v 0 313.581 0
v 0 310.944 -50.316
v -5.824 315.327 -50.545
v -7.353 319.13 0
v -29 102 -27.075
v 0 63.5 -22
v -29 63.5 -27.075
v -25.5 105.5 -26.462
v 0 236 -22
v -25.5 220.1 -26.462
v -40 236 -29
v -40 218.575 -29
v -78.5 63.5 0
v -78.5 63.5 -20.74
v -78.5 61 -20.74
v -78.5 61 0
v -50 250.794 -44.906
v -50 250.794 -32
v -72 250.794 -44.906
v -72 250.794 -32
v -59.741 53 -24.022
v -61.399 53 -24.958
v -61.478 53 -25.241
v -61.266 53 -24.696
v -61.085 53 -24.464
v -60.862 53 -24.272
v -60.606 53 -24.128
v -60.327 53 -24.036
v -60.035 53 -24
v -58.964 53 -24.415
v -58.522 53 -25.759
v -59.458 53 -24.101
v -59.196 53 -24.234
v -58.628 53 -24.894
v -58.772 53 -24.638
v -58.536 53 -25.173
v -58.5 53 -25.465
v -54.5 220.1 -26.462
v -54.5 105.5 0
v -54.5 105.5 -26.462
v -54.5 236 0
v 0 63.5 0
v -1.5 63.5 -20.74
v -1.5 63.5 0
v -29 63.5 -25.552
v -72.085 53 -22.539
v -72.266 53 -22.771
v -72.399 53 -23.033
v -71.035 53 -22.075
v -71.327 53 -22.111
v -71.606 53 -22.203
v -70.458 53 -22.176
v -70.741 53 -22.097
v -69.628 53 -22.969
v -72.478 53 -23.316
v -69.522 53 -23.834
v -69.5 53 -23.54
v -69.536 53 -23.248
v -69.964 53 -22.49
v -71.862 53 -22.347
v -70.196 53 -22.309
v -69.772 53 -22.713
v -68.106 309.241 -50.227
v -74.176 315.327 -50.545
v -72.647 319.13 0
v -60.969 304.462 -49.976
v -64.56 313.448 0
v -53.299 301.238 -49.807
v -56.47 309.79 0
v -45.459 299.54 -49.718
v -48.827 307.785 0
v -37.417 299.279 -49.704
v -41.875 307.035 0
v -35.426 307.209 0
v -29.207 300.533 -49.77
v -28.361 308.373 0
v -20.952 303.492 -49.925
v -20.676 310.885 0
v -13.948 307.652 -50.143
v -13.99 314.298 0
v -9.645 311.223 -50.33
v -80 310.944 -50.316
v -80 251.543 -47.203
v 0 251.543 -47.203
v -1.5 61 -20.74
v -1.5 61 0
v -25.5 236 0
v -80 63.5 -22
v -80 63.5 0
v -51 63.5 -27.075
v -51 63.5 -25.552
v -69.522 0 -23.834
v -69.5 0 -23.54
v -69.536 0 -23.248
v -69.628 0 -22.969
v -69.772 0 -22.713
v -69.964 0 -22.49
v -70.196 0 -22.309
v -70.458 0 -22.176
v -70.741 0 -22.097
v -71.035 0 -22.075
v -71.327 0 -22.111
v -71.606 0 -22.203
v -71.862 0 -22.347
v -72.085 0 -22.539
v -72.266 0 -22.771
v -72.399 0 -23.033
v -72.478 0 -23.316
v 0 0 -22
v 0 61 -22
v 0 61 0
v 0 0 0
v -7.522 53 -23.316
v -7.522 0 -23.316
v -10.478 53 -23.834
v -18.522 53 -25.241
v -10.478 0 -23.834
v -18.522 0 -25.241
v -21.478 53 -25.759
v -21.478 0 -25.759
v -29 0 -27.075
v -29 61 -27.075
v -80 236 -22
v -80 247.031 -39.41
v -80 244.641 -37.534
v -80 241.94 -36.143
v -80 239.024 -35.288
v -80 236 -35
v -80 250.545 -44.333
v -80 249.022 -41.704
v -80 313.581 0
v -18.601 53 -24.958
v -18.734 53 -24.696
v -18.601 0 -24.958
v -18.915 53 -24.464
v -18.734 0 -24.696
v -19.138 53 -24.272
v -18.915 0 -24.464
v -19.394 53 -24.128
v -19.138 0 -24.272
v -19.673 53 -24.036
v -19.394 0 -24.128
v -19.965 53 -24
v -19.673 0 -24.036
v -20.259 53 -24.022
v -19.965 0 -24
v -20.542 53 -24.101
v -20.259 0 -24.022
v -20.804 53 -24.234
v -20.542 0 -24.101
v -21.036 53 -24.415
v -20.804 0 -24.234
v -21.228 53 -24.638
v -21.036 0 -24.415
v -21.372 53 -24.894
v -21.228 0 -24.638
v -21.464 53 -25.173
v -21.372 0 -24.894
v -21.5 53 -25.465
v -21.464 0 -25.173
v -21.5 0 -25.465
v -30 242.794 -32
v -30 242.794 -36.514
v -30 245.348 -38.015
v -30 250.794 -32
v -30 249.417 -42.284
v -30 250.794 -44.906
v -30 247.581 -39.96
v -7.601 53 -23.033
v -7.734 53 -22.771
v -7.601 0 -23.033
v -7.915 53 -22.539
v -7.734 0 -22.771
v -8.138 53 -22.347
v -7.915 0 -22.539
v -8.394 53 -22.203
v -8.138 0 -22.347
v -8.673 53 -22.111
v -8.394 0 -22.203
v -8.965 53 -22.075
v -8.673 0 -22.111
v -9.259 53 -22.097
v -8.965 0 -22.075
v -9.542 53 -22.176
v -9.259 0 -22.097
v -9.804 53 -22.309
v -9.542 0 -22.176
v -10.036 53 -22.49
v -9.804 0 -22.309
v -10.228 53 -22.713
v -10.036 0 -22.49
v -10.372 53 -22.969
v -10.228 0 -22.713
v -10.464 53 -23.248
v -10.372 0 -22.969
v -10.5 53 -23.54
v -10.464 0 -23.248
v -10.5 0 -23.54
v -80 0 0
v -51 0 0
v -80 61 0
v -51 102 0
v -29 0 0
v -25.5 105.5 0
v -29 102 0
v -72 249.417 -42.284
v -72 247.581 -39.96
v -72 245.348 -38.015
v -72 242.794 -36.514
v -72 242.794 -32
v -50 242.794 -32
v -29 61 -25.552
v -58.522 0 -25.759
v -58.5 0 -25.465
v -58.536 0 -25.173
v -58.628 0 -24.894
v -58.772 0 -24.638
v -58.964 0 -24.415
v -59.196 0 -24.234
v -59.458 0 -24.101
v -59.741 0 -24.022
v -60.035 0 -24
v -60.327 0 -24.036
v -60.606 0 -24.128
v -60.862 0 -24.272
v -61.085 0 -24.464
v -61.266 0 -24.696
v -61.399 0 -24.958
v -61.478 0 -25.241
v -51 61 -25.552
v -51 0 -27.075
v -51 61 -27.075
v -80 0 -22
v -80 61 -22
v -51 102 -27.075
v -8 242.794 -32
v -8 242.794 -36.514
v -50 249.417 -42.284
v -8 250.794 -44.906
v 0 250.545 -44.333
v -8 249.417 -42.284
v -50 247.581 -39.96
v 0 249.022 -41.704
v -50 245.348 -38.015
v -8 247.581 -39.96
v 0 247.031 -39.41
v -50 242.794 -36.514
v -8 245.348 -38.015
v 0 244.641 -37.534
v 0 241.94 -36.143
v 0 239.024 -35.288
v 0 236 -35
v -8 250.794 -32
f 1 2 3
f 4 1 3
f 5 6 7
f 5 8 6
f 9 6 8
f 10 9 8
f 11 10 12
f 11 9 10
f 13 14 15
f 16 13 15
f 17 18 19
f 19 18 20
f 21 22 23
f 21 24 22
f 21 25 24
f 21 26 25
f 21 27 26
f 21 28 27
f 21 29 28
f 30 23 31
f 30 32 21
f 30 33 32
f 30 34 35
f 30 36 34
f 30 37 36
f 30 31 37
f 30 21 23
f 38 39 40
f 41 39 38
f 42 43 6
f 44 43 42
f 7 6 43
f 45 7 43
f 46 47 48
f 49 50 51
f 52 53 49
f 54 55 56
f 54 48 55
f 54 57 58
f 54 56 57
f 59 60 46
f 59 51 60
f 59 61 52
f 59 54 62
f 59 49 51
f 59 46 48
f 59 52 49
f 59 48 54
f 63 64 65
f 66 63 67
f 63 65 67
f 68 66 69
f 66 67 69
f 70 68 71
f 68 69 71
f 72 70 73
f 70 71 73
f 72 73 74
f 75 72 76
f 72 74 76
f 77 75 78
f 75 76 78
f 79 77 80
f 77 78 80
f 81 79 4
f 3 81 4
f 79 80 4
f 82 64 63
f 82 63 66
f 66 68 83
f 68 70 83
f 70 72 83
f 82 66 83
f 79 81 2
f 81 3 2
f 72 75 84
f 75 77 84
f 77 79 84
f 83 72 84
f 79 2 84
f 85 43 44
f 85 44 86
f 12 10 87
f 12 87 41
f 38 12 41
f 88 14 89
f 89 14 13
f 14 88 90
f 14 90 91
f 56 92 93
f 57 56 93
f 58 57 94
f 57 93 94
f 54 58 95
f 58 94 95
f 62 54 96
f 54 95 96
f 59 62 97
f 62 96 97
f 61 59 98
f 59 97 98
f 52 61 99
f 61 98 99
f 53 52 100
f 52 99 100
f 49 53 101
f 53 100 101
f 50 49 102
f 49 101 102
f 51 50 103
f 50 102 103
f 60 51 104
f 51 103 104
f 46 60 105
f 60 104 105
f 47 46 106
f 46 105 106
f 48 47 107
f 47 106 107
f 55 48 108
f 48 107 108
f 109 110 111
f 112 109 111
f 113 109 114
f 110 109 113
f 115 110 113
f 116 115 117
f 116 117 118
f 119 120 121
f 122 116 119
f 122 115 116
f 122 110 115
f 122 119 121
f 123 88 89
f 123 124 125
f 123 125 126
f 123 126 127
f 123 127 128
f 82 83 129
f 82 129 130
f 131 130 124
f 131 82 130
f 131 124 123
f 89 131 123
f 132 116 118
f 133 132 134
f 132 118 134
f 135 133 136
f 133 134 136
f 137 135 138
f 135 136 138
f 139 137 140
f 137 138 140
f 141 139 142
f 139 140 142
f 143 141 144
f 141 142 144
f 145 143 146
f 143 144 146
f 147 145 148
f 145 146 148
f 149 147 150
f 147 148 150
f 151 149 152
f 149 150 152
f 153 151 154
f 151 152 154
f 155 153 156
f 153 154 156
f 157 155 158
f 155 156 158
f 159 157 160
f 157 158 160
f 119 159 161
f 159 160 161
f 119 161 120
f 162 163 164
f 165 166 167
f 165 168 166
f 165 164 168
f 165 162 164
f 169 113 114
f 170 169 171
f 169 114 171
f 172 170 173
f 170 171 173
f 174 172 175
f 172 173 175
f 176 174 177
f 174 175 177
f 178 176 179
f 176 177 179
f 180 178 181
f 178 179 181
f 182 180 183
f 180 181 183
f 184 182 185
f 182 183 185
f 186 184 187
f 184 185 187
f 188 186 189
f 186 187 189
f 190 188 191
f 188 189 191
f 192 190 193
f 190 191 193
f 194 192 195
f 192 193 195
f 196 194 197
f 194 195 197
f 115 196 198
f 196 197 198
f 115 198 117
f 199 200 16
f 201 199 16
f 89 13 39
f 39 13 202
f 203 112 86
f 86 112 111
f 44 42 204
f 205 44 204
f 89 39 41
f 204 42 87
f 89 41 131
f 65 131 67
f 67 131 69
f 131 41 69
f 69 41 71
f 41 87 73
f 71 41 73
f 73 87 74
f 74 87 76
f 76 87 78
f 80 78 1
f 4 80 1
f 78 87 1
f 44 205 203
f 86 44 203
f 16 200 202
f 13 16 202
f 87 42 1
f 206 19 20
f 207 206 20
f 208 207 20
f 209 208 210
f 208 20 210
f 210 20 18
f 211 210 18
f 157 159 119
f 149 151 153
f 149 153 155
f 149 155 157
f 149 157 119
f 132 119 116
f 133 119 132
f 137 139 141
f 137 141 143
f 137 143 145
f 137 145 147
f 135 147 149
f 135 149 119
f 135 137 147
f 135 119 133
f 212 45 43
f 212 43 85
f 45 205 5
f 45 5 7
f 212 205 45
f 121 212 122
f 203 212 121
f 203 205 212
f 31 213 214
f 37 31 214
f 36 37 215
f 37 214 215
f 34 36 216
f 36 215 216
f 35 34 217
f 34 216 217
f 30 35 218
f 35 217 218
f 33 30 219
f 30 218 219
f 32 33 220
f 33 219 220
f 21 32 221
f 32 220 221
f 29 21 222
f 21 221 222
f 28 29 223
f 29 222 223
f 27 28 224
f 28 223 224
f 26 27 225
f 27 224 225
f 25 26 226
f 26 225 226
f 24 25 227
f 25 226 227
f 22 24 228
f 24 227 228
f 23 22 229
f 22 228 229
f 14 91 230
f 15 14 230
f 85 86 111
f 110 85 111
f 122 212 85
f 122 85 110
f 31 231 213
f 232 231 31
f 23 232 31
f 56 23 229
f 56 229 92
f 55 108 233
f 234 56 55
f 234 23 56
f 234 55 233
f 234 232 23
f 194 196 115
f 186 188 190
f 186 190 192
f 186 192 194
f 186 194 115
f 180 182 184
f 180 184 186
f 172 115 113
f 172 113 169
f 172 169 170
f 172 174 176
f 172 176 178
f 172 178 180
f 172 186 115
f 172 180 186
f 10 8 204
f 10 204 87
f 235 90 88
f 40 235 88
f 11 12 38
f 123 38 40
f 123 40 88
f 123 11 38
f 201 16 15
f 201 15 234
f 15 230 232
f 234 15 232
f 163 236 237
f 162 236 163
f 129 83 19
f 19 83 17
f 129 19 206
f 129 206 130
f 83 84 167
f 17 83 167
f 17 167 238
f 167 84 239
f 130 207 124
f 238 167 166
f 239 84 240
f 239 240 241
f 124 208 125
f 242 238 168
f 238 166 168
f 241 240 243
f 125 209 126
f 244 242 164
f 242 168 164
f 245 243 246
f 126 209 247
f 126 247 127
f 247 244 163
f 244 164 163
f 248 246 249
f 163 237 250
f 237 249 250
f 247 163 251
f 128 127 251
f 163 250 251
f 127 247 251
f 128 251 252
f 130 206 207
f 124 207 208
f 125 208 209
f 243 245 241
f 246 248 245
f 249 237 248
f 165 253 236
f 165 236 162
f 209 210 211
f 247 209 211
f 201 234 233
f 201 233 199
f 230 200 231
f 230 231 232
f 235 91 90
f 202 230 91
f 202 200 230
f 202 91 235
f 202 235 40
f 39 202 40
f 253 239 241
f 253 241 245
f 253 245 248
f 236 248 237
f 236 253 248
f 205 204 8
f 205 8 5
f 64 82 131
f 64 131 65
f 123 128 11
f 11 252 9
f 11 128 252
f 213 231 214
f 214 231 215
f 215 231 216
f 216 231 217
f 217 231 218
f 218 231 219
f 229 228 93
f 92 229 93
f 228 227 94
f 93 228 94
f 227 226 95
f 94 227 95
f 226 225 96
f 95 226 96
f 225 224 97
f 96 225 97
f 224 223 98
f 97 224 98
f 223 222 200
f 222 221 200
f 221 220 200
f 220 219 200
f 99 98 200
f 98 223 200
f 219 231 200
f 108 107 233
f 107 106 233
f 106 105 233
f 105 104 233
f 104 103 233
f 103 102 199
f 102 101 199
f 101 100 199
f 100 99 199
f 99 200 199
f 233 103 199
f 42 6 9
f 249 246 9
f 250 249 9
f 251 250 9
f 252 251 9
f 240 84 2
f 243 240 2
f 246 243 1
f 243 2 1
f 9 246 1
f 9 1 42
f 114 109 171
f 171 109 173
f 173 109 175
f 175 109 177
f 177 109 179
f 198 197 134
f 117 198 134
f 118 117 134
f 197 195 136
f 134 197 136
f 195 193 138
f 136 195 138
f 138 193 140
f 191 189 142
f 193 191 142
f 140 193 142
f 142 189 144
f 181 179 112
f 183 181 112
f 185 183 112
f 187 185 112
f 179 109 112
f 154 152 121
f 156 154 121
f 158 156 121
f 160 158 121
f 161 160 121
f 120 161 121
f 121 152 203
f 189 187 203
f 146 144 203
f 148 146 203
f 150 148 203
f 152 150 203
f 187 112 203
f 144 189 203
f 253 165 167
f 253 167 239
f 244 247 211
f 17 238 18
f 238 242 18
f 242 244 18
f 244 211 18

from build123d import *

# Parameters (mm, degrees)
EXTRUDE_1_DEPTH     = 80
CUT_EXTRUDE_1_DEPTH = 338.16811987
CUT_EXTRUDE_4_DEPTH = 258.724089853
EXTRUDE_2_DEPTH     = 236
SKETCH_8_W          = 29
SKETCH_8_H          = 45.03
CUT_EXTRUDE_5_DEPTH = 333.864316987
SKETCH_11_W         = 1.5
SKETCH_11_H         = 2.5
SKETCH_12_R         = 1.5
CUT_EXTRUDE_6_DEPTH = 53


with BuildPart() as part:
    # Эскиз1 → Бобышка-Вытянуть1 (new body)
    with BuildSketch(Plane(origin=(0, 0, 0), x_dir=(0, 0, -1), z_dir=(1, 0, 0))):
        with BuildLine():
            Line((0, 0), (0, 324))
            Line((0, 324), (51, 324))
            Line((51, 324), (47.202681995, 251.542856107))
            ThreePointArc((47.202681995, 251.542856107), (38.415146245, 245.880357077), (35, 236))
            Line((35, 236), (22, 236))
            Line((22, 236), (22, 0))
            Line((22, 0), (0, 0))
        make_face()
    extrude(amount=-EXTRUDE_1_DEPTH)

    # Вырез-По сечениям1: read off the stored shape, not the designer's step
    # Вырез-По сечениям1: loft between two sections, ruled curve by curve
    loft_1_from = [
        Edge.make_bspline([(-39.686086493, 386.998880194, -51), (-41.519373167, 387.011959923, -51), (-43.469191145, 386.912155262, -51), (-47.589656467, 386.390203752, -51), (-49.760899046, 385.967798341, -51), (-54.275759928, 384.685843196, -51), (-56.619984777, 383.82558407, -51), (-61.376492683, 381.5486416, -51), (-63.789033826, 380.130665414, -51), (-68.507360794, 376.644239105, -51), (-70.812489477, 374.574106824, -51), (-74.008903802, 370.963867661, -51), (-75.030367598, 369.677012554, -51), (-76.951946734, 366.944587811, -51), (-77.851980564, 365.498997396, -51), (-79.497654124, 362.465678388, -51), (-80.243201605, 360.877958795, -51), (-81.549913197, 357.585657318, -51), (-82.110987295, 355.881119395, -51), (-83.024607662, 352.388377038, -51), (-83.377081555, 350.600250078, -51), (-83.857698345, 346.979610705, -51), (-83.985800464, 345.147200182, -51), (-84.011959923, 341.480626833, -51), (-83.910016471, 339.646575032, -51), (-83.481109456, 336.019446589, -51), (-83.154185214, 334.226472409, -51), (-82.290493812, 330.721049679, -51), (-81.753797915, 329.008679629, -51), (-80.494195327, 325.69806858, -51), (-79.771378013, 324.099872821, -51), (-78.169152689, 321.043381421, -51), (-77.289836791, 319.585096094, -51), (-75.407440689, 316.825531587, -51), (-74.404442283, 315.524232794, -51), (-71.259865805, 311.868753328, -51), (-68.984509326, 309.765941211, -51), (-64.316408519, 306.212546688, -51), (-61.924345268, 304.76029167, -51), (-57.200809972, 302.415713078, -51), (-54.869098312, 301.522093112, -51), (-50.372988531, 300.17584848, -51), (-48.207994046, 299.722505841, -51), (-44.095395614, 299.141814883, -51), (-42.147200182, 299.014199536, -51), (-38.480626833, 298.988040077, -51), (-36.530808855, 299.087844738, -51), (-32.410343533, 299.609796248, -51), (-30.239100954, 300.032201659, -51), (-25.724240072, 301.314156804, -51), (-23.380015223, 302.17441593, -51), (-18.623507317, 304.4513584, -51), (-16.210966174, 305.869334586, -51), (-11.492639206, 309.355760895, -51), (-9.187510523, 311.425893176, -51), (-5.991096198, 315.036132339, -51), (-4.969632402, 316.322987446, -51), (-3.048053266, 319.055412189, -51), (-2.148019436, 320.501002604, -51), (-0.502345876, 323.534321612, -51), (0.243201605, 325.122041205, -51), (1.549913197, 328.414342682, -51), (2.110987295, 330.118880605, -51), (3.024607662, 333.611622962, -51), (3.377081555, 335.399749922, -51), (3.857698345, 339.020389295, -51), (3.985800464, 340.852799818, -51), (4.011959923, 344.519373167, -51), (3.910016471, 346.353424968, -51), (3.481109456, 349.980553411, -51), (3.154185214, 351.773527591, -51), (2.290493812, 355.278950321, -51), (1.753797915, 356.991320371, -51), (0.494195327, 360.30193142, -51), (-0.228621987, 361.900127179, -51), (-1.830847311, 364.956618579, -51), (-2.710163209, 366.414903906, -51), (-4.592559311, 369.174468413, -51), (-5.595557717, 370.475767206, -51), (-8.740134195, 374.131246672, -51), (-11.015490674, 376.234058789, -51), (-15.683591481, 379.787453312, -51), (-18.075654732, 381.23970833, -51), (-22.799190028, 383.584286922, -51), (-25.130901688, 384.477906888, -51), (-29.627011469, 385.82415152, -51), (-31.792005954, 386.277494159, -51), (-35.904604386, 386.858185117, -51), (-37.852799818, 386.985800464, -51), (-39.686086493, 386.998880194, -51)], [0.5, 0.5, 0.5, 0.5, 0.53125, 0.53125, 0.5625, 0.5625, 0.59375, 0.59375, 0.625, 0.625, 0.65625, 0.65625, 0.671875, 0.671875, 0.6875, 0.6875, 0.703125, 0.703125, 0.71875, 0.71875, 0.734375, 0.734375, 0.75, 0.75, 0.765625, 0.765625, 0.78125, 0.78125, 0.796875, 0.796875, 0.8125, 0.8125, 0.828125, 0.828125, 0.84375, 0.84375, 0.875, 0.875, 0.90625, 0.90625, 0.9375, 0.9375, 0.96875, 0.96875, 1, 1, 1.03125, 1.03125, 1.0625, 1.0625, 1.09375, 1.09375, 1.125, 1.125, 1.15625, 1.15625, 1.171875, 1.171875, 1.1875, 1.1875, 1.203125, 1.203125, 1.21875, 1.21875, 1.234375, 1.234375, 1.25, 1.25, 1.265625, 1.265625, 1.28125, 1.28125, 1.296875, 1.296875, 1.3125, 1.3125, 1.328125, 1.328125, 1.34375, 1.34375, 1.375, 1.375, 1.40625, 1.40625, 1.4375, 1.4375, 1.46875, 1.46875, 1.5, 1.5, 1.5, 1.5], 3),
    ]
    loft_1_to = [
        Edge.make_bspline([(-40.713360954, 406.994910903, 0), (-42.796482241, 406.965187529, 0), (-45.009249926, 406.804381918, 0), (-49.677831319, 406.111186343, 0), (-52.134314987, 405.57848815, 0), (-57.232488149, 404.012258649, 0), (-59.874849492, 402.977906649, 0), (-65.223361777, 400.275392116, 0), (-67.929774494, 398.605754504, 0), (-73.205496114, 394.530069796, 0), (-75.774017529, 392.122127574, 0), (-79.317678059, 387.942789724, 0), (-80.446871791, 386.455948521, 0), (-82.56353512, 383.304901046, 0), (-83.550911607, 381.64067315, 0), (-85.346800294, 378.15448837, 0), (-86.155207908, 376.332543952, 0), (-87.559702616, 372.560371453, 0), (-88.155688516, 370.610195503, 0), (-89.108716472, 366.619860939, 0), (-89.465678189, 364.579792104, 0), (-89.923659015, 360.454683427, 0), (-90.024634276, 358.369760334, 0), (-89.965187529, 354.203517759, 0), (-89.804767323, 352.122324432, 0), (-89.229277266, 348.011962011, 0), (-88.814254578, 345.982908368, 0), (-87.74776424, 342.021389647, 0), (-87.09637946, 340.08901202, 0), (-85.584830664, 336.358447587, 0), (-84.72476929, 334.560310005, 0), (-82.830145523, 331.126783934, 0), (-81.795688029, 329.491404922, 0), (-79.589982191, 326.402031913, 0), (-78.418826302, 324.948013642, 0), (-74.757365501, 320.871483301, 0), (-72.121187465, 318.537805224, 0), (-66.731328092, 314.614304187, 0), (-63.978379853, 313.022564402, 0), (-58.5549381, 310.473751342, 0), (-55.884140832, 309.515211055, 0), (-50.743356242, 308.095077878, 0), (-48.27267393, 307.632683797, 0), (-43.586215216, 307.072972214, 0), (-41.369760334, 306.975365724, 0), (-37.203517759, 307.034812471, 0), (-34.990750074, 307.195618082, 0), (-30.322168681, 307.888813657, 0), (-27.865685013, 308.42151185, 0), (-22.767511851, 309.987741351, 0), (-20.125150508, 311.022093351, 0), (-14.776638223, 313.724607884, 0), (-12.070225506, 315.394245496, 0), (-6.794503886, 319.469930204, 0), (-4.225982471, 321.877872426, 0), (-0.682321941, 326.057210276, 0), (0.446871791, 327.544051479, 0), (2.56353512, 330.695098954, 0), (3.550911607, 332.35932685, 0), (5.346800294, 335.84551163, 0), (6.155207908, 337.667456048, 0), (7.559702616, 341.439628547, 0), (8.155688516, 343.389804497, 0), (9.108716472, 347.380139061, 0), (9.465678189, 349.420207896, 0), (9.923659015, 353.545316573, 0), (10.024634276, 355.630239666, 0), (9.965187529, 359.796482241, 0), (9.804767323, 361.877675568, 0), (9.229277266, 365.988037989, 0), (8.814254578, 368.017091632, 0), (7.74776424, 371.978610353, 0), (7.09637946, 373.91098798, 0), (5.584830664, 377.641552413, 0), (4.72476929, 379.439689995, 0), (2.830145523, 382.873216066, 0), (1.795688029, 384.508595078, 0), (-0.410017809, 387.597968087, 0), (-1.581173698, 389.051986358, 0), (-5.242634499, 393.128516699, 0), (-7.878812535, 395.462194776, 0), (-13.268671908, 399.385695813, 0), (-16.021620147, 400.977435598, 0), (-21.4450619, 403.526248658, 0), (-24.115859168, 404.484788945, 0), (-29.256643758, 405.904922122, 0), (-31.72732607, 406.367316203, 0), (-36.413784784, 406.927027786, 0), (-38.630239666, 407.024634276, 0), (-40.713360954, 406.994910903, 0)], [0.5, 0.5, 0.5, 0.5, 0.53125, 0.53125, 0.5625, 0.5625, 0.59375, 0.59375, 0.625, 0.625, 0.65625, 0.65625, 0.671875, 0.671875, 0.6875, 0.6875, 0.703125, 0.703125, 0.71875, 0.71875, 0.734375, 0.734375, 0.75, 0.75, 0.765625, 0.765625, 0.78125, 0.78125, 0.796875, 0.796875, 0.8125, 0.8125, 0.828125, 0.828125, 0.84375, 0.84375, 0.875, 0.875, 0.90625, 0.90625, 0.9375, 0.9375, 0.96875, 0.96875, 1, 1, 1.03125, 1.03125, 1.0625, 1.0625, 1.09375, 1.09375, 1.125, 1.125, 1.15625, 1.15625, 1.171875, 1.171875, 1.1875, 1.1875, 1.203125, 1.203125, 1.21875, 1.21875, 1.234375, 1.234375, 1.25, 1.25, 1.265625, 1.265625, 1.28125, 1.28125, 1.296875, 1.296875, 1.3125, 1.3125, 1.328125, 1.328125, 1.34375, 1.34375, 1.375, 1.375, 1.40625, 1.40625, 1.4375, 1.4375, 1.46875, 1.46875, 1.5, 1.5, 1.5, 1.5], 3),
    ]
    loft_1 = Solid(Shell([*[Face.make_surface_from_curves(loft_1_from[k], loft_1_to[k]) for k in range(1)], Face(Wire(loft_1_from)), Face(Wire(loft_1_to))]))
    add(loft_1, mode=Mode.SUBTRACT)

    # Эскиз5 → Вырез-Вытянуть1 (cut, through all)
    with BuildSketch(Plane(origin=(0, -1.778022863, -33.926697283), x_dir=(-1, 0, 0), z_dir=(0, -0.05233595624294387, -0.998629534754574))):
        Polygon((80, 313.151391037), (56.299680313, 331.010862926), (80, 331.010862926), align=None)
        Polygon((0, 313.151391037), (23.700319687, 331.010862926), (0, 331.010862926), align=None)
    extrude(amount=-CUT_EXTRUDE_1_DEPTH, mode=Mode.SUBTRACT)

    # Эскиз3 → Вырез-Вытянуть4 (cut, through all)
    with BuildSketch(Plane(origin=(-50, 250.794151495, -32), x_dir=(-0.9397934234884354, -0.341743063086709, -1.1856594285774567e-15), z_dir=(0, 0, -1))):
        Polygon((0, 0), (20.675455317, 7.518347388), (23.409399821, 0), (2.733944505, -7.518347388), align=None)
    cut_extrude_4 = extrude(amount=CUT_EXTRUDE_4_DEPTH, mode=Mode.SUBTRACT)

    # Зеркальное отражение1: Вырез-Вытянуть4 across plane
    add(cut_extrude_4.mirror(Plane(origin=(-40, 0, 0), x_dir=(0, 0, 1), z_dir=(1, 0, 0))), mode=Mode.SUBTRACT)

    # Эскиз6 → Бобышка-Вытянуть2 (add)
    with BuildSketch(Plane.XZ.offset(-236)):
        Polygon((0, -22), (-40, -29), (-80, -22), align=None)
    extrude(amount=EXTRUDE_2_DEPTH)

    # Вырез-По траектории1: sweep along a curve in space
    with BuildLine() as sweep_1_path:
        Line((-40, 236, 0), (-40, 206.49134077, -49.110656108))
    # Эскиз8 → Вырез-По траектории1 (sweep, cut)
    with BuildSketch(Plane.XY):
        with Locations((-40, 213.485)):
            Rectangle(SKETCH_8_W, SKETCH_8_H)
    sweep(path=sweep_1_path.line, mode=Mode.SUBTRACT)

    # Эскиз9 → Вырез-Вытянуть5 (cut, through all)
    with BuildSketch(Plane.XY):
        Polygon((-54.5, 190.97), (-25.5, 190.97), (-25.5, 105.5), (-29, 102), (-29, 0), (-51, 0), (-51, 102), (-54.5, 105.5), align=None)
    extrude(amount=-CUT_EXTRUDE_5_DEPTH, mode=Mode.SUBTRACT)

    # Вырез-По траектории4: sweep along a curve in space
    with BuildLine() as sweep_4_path:
        Line((0, 62.25, 0), (0, 62.25, -22))
        Line((0, 62.25, -22), (-29, 62.25, -27.075))
    # Эскиз11 → Вырез-По траектории4 (sweep, cut)
    with BuildSketch(Plane.XY):
        with Locations((-0.75, 62.25)):
            Rectangle(SKETCH_11_W, SKETCH_11_H)
    sweep_4 = sweep(path=sweep_4_path.line, transition=Transition.RIGHT, mode=Mode.SUBTRACT)

    # Зеркальное отражение2: Вырез-По траектории4 across plane
    add(sweep_4.mirror(Plane(origin=(-40, 0, 0), x_dir=(0, 0, 1), z_dir=(1, 0, 0))), mode=Mode.SUBTRACT)

    # Эскиз12 → Вырез-Вытянуть6 (cut)
    with BuildSketch(Plane.XZ):
        with Locations((-20, -25.5)):
            Circle(SKETCH_12_R)
        with Locations((-9, -23.575)):
            Circle(SKETCH_12_R)
        with Locations((-60, -25.5)):
            Circle(SKETCH_12_R)
        with Locations((-71, -23.575)):
            Circle(SKETCH_12_R)
    extrude(amount=-CUT_EXTRUDE_6_DEPTH, mode=Mode.SUBTRACT)


solid = part.part
